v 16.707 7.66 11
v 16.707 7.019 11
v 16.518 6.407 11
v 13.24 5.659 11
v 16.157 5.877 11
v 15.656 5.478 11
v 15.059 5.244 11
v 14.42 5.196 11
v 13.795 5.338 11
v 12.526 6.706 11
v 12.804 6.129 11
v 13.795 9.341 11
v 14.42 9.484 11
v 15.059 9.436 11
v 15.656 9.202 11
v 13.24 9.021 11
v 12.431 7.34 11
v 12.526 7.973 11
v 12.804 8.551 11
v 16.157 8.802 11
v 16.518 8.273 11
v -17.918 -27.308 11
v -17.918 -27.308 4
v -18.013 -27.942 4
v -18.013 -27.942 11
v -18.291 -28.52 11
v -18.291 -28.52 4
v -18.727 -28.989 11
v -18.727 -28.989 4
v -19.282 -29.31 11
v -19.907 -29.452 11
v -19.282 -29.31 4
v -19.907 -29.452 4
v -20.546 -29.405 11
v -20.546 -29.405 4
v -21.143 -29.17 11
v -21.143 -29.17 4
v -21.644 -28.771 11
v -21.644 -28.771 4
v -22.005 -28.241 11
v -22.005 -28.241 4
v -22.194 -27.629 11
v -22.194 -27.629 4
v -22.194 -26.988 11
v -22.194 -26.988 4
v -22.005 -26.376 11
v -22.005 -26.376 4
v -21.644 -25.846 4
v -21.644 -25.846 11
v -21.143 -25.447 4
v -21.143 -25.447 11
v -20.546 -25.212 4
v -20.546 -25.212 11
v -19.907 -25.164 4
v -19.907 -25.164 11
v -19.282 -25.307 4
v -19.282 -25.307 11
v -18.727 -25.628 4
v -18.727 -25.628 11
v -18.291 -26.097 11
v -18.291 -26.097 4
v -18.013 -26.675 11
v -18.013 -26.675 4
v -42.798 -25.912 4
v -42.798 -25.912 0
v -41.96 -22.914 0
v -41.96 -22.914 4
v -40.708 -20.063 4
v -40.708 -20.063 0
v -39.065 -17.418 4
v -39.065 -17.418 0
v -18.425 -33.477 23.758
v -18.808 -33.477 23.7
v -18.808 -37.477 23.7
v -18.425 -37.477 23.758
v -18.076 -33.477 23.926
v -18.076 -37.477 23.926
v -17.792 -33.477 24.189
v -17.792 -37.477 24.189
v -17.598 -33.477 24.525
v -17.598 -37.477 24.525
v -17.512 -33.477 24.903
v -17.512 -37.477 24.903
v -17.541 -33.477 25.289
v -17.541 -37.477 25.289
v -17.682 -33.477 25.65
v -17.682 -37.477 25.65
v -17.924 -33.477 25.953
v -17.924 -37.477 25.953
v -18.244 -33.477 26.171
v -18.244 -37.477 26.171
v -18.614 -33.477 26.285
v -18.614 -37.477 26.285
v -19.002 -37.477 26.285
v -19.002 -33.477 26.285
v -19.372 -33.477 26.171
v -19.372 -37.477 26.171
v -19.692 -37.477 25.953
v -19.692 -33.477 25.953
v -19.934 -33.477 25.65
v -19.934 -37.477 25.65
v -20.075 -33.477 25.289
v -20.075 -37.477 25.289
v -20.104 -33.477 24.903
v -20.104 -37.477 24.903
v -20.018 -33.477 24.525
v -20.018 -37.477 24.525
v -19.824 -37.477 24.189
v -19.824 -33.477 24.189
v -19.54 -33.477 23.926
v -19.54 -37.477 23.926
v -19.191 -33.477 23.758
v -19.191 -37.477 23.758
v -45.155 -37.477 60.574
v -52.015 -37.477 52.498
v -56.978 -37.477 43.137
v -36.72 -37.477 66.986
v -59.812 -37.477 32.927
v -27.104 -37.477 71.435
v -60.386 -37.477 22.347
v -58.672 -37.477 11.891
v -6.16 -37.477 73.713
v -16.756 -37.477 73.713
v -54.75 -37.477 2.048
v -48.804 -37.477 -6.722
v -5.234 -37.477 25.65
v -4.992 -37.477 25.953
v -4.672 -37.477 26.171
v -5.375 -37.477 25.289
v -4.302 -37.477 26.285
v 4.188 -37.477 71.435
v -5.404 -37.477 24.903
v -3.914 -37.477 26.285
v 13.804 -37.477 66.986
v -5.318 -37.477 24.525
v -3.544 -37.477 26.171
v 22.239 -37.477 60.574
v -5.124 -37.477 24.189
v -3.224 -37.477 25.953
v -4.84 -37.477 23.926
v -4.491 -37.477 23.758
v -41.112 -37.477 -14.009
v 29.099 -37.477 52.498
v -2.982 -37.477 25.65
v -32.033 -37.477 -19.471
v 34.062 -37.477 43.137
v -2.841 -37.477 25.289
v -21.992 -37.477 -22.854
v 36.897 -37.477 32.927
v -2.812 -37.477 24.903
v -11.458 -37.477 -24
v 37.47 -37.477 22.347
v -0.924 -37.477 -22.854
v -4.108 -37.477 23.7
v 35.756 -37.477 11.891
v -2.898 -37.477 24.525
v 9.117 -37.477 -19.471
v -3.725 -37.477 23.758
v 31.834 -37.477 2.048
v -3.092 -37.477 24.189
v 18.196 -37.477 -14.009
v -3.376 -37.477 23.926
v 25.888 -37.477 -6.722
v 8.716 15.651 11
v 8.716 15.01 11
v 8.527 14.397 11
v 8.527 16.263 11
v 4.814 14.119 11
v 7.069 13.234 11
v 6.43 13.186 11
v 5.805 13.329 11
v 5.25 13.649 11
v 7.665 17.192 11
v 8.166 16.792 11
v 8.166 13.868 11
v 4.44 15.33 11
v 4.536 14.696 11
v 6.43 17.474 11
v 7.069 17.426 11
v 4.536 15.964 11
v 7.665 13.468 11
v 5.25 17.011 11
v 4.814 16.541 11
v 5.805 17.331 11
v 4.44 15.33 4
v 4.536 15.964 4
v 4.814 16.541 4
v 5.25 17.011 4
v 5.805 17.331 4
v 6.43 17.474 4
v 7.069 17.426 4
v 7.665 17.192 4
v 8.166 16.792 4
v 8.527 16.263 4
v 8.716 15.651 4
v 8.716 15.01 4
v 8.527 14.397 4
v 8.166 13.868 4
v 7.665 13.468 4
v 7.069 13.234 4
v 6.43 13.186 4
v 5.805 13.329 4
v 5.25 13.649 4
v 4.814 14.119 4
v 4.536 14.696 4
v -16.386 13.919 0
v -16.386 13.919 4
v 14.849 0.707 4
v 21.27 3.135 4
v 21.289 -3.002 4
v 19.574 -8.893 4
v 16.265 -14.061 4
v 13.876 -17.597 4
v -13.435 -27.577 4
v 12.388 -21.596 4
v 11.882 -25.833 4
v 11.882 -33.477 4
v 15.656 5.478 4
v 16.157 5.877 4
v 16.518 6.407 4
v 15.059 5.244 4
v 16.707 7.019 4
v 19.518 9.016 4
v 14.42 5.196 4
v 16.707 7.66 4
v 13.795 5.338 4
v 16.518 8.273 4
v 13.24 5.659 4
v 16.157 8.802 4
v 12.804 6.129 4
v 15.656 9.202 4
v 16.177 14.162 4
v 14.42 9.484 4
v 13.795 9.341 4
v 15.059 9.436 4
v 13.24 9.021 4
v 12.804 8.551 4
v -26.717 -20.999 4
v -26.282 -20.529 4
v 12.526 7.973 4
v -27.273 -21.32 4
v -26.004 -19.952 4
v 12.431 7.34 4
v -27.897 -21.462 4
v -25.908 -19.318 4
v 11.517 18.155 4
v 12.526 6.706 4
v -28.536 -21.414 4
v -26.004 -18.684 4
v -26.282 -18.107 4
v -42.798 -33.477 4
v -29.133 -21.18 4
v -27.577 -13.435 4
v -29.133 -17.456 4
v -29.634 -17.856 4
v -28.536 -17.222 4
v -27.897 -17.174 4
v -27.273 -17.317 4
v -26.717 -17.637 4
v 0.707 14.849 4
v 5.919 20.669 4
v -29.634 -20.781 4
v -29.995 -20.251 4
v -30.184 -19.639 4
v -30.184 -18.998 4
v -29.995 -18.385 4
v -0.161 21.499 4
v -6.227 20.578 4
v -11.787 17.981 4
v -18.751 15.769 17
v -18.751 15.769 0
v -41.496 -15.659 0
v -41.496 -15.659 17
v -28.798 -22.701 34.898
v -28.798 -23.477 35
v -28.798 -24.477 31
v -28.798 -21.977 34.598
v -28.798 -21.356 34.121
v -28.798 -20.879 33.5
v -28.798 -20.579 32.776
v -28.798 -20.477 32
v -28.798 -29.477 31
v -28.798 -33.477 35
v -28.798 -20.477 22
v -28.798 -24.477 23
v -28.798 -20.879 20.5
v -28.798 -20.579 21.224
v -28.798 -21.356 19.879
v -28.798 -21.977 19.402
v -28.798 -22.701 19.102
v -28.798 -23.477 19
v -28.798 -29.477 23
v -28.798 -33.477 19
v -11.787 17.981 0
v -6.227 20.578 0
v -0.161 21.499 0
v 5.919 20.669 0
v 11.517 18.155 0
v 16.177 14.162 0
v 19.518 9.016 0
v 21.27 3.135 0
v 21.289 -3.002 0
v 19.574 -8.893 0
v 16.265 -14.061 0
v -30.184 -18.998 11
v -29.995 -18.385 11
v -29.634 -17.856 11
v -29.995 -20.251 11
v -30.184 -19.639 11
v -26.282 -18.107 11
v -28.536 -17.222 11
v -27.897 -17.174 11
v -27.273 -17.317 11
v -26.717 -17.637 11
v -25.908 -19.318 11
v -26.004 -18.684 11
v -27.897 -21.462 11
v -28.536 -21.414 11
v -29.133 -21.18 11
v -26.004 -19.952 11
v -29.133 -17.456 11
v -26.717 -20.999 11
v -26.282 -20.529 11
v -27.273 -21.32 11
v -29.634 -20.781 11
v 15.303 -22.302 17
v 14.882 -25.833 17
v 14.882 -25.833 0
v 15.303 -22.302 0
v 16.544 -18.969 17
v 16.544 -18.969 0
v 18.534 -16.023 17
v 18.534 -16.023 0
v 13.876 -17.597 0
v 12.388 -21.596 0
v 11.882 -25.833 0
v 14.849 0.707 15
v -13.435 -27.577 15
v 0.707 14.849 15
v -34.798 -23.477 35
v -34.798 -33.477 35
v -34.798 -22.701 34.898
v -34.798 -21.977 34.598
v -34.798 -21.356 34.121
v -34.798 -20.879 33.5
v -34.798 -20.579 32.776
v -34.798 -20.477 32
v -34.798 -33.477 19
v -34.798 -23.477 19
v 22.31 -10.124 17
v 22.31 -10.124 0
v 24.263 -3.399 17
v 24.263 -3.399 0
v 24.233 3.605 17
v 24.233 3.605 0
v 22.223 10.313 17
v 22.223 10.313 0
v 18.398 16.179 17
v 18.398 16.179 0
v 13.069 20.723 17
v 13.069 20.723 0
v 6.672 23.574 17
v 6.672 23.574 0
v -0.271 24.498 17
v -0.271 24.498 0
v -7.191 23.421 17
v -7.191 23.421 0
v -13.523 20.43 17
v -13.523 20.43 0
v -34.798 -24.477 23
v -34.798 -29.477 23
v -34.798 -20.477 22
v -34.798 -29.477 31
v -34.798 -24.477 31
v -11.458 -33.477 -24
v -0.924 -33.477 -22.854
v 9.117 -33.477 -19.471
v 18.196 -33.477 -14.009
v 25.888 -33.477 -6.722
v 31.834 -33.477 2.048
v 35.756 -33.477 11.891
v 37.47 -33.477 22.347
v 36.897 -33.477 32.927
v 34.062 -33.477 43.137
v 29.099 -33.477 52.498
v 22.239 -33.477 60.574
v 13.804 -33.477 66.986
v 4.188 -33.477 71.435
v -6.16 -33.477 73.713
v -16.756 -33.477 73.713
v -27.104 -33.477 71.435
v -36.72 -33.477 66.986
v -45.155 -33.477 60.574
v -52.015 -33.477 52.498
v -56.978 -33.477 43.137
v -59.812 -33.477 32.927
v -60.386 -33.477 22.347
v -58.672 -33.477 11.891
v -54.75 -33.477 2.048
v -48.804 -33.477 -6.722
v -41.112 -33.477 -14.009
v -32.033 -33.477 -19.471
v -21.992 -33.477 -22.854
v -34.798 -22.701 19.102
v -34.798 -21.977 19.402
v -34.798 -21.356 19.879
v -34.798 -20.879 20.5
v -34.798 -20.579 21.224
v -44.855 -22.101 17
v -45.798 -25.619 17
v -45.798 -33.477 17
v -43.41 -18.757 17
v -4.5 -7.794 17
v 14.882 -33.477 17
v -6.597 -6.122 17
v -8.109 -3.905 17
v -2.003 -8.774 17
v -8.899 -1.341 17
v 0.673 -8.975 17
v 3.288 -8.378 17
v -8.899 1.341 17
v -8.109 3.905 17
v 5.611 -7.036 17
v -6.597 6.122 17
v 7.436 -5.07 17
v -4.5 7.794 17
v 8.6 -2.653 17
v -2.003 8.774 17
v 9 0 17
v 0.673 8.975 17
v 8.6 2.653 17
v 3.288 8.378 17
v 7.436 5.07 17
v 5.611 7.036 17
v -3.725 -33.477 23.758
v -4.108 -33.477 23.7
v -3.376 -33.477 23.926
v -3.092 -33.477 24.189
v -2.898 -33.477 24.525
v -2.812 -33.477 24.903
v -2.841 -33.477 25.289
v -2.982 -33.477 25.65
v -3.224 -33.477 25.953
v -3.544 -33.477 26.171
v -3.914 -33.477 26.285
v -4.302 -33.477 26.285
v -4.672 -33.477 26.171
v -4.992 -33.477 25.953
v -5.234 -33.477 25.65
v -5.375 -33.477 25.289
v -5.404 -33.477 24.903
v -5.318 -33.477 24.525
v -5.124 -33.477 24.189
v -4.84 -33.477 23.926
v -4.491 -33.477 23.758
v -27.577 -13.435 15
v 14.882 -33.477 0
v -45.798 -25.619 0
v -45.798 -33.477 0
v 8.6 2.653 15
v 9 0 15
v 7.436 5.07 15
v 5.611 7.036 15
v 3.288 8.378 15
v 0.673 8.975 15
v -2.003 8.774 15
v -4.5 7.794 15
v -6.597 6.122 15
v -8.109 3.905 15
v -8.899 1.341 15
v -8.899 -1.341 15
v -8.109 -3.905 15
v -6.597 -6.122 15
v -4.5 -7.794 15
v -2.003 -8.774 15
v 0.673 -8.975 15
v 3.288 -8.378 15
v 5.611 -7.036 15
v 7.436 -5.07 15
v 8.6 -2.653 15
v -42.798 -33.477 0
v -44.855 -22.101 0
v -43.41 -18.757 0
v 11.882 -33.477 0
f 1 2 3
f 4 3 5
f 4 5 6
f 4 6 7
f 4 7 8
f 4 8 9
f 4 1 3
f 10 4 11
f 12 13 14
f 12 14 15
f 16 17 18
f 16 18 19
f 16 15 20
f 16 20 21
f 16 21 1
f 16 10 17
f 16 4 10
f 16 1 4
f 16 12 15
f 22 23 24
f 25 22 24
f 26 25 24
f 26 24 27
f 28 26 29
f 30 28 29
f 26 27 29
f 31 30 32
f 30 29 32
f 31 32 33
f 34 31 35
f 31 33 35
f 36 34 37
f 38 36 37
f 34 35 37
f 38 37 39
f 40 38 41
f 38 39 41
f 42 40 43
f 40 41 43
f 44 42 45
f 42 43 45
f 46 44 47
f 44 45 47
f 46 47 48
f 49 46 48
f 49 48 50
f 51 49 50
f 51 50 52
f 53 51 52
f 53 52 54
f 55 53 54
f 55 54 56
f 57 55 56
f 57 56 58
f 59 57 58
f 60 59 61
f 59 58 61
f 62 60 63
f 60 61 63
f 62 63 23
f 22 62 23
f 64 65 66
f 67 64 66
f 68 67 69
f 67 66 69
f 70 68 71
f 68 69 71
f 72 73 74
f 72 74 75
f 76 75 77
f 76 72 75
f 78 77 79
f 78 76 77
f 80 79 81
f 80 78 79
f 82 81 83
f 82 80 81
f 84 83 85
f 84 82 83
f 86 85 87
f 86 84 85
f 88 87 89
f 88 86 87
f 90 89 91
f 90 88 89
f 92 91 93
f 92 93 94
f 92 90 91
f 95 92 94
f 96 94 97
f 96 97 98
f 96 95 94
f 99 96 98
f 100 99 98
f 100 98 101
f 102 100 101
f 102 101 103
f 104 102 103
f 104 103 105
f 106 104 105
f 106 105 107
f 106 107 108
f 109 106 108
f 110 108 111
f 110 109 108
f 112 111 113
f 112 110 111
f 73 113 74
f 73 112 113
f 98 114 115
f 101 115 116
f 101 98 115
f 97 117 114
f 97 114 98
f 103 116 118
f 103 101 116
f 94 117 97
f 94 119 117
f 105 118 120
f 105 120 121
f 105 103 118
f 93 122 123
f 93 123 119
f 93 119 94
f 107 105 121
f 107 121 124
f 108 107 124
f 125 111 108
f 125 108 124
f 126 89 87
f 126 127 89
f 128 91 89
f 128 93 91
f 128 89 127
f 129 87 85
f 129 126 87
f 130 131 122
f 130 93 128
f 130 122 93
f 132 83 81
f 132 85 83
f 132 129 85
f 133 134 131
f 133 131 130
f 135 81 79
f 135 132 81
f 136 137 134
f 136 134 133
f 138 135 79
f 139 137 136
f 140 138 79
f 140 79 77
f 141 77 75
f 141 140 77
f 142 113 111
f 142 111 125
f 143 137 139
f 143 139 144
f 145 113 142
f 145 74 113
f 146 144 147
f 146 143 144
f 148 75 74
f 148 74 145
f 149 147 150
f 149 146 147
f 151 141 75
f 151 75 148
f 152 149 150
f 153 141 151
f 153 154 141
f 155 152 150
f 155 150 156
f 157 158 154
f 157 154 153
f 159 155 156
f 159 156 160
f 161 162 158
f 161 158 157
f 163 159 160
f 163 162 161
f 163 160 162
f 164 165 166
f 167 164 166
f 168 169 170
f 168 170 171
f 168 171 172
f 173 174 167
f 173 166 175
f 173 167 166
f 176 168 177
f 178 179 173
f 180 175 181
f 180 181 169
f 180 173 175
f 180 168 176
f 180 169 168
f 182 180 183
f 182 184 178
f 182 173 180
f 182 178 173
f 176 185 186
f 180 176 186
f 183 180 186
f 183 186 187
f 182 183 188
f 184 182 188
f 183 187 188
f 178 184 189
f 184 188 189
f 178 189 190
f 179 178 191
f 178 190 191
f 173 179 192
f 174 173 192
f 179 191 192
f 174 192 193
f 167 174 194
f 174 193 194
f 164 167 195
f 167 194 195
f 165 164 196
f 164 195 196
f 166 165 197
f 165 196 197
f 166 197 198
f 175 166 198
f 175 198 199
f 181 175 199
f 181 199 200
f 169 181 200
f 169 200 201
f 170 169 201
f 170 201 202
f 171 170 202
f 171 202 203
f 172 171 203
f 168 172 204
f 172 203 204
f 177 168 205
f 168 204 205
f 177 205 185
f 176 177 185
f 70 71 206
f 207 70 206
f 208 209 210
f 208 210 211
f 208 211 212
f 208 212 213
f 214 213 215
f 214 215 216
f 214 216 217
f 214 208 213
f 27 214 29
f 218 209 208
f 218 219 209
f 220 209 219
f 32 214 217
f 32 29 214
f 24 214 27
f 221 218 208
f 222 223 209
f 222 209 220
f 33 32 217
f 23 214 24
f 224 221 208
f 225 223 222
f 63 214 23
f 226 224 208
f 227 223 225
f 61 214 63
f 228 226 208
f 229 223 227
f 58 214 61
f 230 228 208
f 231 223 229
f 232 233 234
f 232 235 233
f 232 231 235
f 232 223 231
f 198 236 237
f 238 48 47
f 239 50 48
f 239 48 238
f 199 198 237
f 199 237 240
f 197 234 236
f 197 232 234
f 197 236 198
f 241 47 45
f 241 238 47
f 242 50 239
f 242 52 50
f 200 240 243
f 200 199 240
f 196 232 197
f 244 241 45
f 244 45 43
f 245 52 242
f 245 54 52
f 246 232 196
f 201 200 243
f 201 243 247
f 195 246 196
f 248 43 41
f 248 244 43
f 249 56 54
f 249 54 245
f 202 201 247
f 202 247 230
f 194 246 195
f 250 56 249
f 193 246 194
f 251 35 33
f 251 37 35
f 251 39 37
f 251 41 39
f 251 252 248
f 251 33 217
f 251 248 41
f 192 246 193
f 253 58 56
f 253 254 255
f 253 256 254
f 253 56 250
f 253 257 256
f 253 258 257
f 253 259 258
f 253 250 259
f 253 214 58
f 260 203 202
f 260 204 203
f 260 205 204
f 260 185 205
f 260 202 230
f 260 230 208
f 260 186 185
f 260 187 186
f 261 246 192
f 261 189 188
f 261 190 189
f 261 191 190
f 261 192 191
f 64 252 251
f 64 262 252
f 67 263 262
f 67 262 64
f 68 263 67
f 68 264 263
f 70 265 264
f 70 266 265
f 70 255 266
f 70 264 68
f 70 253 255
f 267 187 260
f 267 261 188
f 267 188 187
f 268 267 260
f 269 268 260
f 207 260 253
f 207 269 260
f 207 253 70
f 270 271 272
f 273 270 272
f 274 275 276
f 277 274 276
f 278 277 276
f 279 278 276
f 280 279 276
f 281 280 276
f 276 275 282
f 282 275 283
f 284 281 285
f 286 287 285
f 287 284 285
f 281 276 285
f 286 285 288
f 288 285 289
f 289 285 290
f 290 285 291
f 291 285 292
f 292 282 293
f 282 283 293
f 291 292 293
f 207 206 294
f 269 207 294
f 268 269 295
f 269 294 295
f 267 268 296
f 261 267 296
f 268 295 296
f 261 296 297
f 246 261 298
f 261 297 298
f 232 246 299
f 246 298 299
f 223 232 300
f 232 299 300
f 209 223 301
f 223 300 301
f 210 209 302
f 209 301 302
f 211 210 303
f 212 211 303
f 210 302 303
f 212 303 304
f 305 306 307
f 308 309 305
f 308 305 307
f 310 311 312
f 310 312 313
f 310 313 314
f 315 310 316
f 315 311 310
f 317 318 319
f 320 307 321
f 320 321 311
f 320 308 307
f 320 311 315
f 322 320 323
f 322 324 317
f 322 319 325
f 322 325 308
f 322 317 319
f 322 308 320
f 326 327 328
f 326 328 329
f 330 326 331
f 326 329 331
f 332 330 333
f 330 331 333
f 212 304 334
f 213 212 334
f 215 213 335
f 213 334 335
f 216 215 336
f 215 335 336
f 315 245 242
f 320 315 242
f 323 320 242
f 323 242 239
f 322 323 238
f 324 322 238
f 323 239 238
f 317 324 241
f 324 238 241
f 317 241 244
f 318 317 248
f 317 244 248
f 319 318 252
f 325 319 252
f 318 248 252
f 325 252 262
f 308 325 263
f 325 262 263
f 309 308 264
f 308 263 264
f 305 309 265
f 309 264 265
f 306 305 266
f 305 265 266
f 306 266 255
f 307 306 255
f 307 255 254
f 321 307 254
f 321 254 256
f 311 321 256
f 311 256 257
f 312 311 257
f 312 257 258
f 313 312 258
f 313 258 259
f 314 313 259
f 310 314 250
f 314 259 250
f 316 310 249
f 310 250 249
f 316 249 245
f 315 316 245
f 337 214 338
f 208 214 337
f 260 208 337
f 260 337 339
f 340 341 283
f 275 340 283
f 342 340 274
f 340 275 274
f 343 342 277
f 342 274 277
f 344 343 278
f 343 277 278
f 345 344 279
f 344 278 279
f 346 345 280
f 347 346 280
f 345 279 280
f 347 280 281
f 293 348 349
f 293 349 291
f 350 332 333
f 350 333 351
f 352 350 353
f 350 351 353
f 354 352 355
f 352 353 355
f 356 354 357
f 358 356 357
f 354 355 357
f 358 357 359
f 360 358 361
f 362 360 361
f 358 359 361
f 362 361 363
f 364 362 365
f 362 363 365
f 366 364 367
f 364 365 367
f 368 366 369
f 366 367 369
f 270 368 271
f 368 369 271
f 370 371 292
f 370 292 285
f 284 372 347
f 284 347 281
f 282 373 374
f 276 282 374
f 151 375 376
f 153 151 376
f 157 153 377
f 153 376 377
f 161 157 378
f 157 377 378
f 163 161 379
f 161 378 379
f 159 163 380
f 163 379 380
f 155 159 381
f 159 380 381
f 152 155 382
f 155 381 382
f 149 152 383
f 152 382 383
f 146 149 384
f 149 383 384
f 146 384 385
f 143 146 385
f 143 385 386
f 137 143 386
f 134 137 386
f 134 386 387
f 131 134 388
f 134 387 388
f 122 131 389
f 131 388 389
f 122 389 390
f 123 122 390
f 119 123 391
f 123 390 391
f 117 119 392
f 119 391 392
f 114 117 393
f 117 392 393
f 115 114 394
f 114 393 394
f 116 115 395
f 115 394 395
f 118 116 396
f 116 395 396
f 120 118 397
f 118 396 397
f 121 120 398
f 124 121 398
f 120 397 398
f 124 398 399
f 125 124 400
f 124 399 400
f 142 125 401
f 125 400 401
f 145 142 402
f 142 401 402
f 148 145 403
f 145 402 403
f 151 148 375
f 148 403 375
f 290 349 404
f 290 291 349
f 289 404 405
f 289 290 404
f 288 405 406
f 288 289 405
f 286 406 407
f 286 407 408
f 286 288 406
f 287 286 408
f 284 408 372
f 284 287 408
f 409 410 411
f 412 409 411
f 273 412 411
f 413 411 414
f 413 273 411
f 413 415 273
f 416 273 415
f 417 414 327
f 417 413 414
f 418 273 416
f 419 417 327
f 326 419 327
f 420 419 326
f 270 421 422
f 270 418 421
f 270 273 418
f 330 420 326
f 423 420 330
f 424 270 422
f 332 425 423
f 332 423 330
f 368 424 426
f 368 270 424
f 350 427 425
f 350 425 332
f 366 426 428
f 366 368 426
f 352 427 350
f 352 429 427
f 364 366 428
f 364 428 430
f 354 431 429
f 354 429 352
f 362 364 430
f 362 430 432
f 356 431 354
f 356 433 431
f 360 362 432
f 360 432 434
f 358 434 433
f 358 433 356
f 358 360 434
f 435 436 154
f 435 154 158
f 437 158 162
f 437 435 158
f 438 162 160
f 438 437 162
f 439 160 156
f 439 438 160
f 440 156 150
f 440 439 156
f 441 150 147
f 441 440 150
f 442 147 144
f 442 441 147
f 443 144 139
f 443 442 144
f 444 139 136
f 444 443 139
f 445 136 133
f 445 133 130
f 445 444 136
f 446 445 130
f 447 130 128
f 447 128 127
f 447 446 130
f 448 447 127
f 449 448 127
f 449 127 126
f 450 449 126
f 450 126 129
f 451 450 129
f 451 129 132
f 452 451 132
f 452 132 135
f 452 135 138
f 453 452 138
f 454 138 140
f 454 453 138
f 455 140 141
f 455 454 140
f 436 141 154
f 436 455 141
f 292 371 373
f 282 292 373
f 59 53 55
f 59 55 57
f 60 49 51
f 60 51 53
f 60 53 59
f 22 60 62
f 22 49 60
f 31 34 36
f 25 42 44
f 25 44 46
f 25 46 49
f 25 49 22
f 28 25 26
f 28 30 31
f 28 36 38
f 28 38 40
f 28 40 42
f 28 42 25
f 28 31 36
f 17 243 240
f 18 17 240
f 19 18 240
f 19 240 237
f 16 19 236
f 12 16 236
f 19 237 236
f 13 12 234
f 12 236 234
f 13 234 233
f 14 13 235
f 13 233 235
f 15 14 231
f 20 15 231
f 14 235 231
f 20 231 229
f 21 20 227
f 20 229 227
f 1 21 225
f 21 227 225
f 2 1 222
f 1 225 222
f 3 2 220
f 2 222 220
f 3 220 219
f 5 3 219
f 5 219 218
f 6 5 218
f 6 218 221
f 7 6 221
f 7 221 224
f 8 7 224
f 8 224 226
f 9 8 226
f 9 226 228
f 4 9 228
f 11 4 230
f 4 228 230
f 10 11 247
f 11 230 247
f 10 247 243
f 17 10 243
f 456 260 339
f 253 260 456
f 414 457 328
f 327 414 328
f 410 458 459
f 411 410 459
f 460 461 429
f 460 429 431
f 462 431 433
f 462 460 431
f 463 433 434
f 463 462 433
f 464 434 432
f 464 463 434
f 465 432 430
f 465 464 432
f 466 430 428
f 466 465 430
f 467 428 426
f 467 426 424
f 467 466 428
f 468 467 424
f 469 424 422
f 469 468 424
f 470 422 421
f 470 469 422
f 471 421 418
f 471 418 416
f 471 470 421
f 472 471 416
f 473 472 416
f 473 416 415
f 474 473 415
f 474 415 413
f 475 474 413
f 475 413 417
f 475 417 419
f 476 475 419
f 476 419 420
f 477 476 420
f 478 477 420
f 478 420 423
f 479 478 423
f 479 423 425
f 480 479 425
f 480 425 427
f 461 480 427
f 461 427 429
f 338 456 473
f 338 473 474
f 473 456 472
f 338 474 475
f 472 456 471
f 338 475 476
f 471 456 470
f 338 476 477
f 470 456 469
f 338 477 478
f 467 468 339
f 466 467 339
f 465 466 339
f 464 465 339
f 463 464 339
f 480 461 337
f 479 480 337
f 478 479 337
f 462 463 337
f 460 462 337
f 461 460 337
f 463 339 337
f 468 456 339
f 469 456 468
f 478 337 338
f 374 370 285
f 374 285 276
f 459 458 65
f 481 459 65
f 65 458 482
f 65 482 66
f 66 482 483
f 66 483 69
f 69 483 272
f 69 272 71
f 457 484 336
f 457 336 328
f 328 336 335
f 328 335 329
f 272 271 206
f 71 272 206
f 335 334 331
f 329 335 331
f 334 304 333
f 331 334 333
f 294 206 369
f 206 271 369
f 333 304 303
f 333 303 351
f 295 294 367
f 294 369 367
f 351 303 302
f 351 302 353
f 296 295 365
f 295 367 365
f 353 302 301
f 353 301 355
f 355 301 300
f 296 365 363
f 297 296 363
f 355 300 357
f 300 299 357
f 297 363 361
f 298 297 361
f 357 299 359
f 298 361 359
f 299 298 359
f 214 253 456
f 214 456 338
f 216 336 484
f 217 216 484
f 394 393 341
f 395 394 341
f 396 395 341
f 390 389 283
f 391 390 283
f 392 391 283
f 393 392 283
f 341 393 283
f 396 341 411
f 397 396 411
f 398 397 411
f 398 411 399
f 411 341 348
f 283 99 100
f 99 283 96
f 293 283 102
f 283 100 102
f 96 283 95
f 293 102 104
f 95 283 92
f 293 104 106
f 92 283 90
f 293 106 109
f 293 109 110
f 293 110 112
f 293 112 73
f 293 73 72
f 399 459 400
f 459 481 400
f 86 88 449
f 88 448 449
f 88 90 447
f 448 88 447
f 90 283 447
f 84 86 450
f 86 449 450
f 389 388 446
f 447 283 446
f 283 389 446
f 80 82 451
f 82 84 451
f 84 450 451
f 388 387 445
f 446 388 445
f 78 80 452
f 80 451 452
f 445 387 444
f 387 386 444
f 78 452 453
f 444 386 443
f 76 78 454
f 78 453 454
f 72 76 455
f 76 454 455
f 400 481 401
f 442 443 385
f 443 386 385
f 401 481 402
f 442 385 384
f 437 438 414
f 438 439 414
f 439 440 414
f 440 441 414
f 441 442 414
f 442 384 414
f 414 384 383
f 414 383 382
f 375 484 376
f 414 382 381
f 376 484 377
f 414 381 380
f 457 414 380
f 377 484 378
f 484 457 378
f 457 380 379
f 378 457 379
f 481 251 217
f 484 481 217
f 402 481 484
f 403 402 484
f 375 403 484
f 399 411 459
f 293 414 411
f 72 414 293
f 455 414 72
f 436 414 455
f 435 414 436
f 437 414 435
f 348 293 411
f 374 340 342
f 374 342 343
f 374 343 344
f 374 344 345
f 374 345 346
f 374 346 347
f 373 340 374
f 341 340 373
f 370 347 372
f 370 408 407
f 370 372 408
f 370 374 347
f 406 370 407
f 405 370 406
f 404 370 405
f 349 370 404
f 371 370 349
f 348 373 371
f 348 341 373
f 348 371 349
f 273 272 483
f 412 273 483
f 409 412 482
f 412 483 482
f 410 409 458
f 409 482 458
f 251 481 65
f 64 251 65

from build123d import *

# Parameters (mm, degrees)
SKETCH2_R           = 9
BOSS_EXTRUDE1_DEPTH = 17
CUT_EXTRUDE1_DEPTH  = 4
SKETCH5_R           = 9
CUT_EXTRUDE3_DEPTH  = 11
SKETCH7_R           = 2.15
CUT_EXTRUDE4_DEPTH  = 7
SKETCH8_R           = 49
SKETCH8_R_2         = 1.3
BOSS_EXTRUDE2_DEPTH = 4
SKETCH9_W           = 6
SKETCH9_H           = 16
BOSS_EXTRUDE3_DEPTH = 13
FILLET1_R           = 3
SKETCH10_W          = 8
SKETCH10_H          = 5
CUT_EXTRUDE5_DEPTH  = 13


with BuildPart() as part:
    # Sketch2 → Boss-Extrude1 (new body)
    with BuildSketch(Plane.XY):
        with BuildLine():
            Line((14.881784229, -33.477238974), (14.881784229, -25.832605203))
            ThreePointArc((14.881784229, -25.832605203), (15.824526426, -20.598724896), (18.534251304, -16.022737899))
            ThreePointArc((18.534251304, -16.022737899), (15.896271469, 18.642831184), (-18.750548152, 15.769069256))
            Line((-18.750548152, 15.769069256), (-41.495728933, -15.659285702))
            ThreePointArc((-41.495728933, -15.659285702), (-44.193480097, -20.402788352), (-45.797718556, -25.618638973))
            Line((-45.797718556, -25.618638973), (-45.797718556, -33.477238974))
            Line((-45.797718556, -33.477238974), (14.881784229, -33.477238974))
        make_face()
        Circle(SKETCH2_R, mode=Mode.SUBTRACT)
    extrude(amount=BOSS_EXTRUDE1_DEPTH)

    # Sketch4 → Cut-Extrude1 (cut)
    with BuildSketch(Plane(origin=(0, 0, 0), x_dir=(-1, 0, 0), z_dir=(0, 0, -1))):
        with BuildLine():
            Line((-11.881784229, -30.477238974), (-11.881784229, -33.477238974))
            Line((-11.881784229, -33.477238974), (42.797718556, -33.477238974))
            Line((42.797718556, -33.477238974), (42.797718556, -30.477238974))
            Line((42.797718556, -30.477238974), (42.797718556, -25.912200391))
            ThreePointArc((42.797718556, -25.912200391), (41.384433584, -21.466180319), (39.065414716, -17.418141241))
            Line((39.065414716, -17.418141241), (16.386356383, 13.918848439))
            ThreePointArc((16.386356383, 13.918848439), (-13.989938582, 16.325704757), (-16.264744719, -14.060764438))
            ThreePointArc((-16.264744719, -14.060764438), (-13.013074866, -19.551948835), (-11.881784229, -25.832605203))
            Line((-11.881784229, -25.832605203), (-11.881784229, -30.477238974))
        make_face()
    extrude(amount=-CUT_EXTRUDE1_DEPTH, mode=Mode.SUBTRACT)

    # Sketch5 → Cut-Extrude3 (cut)
    with BuildSketch(Plane(origin=(0, 0, 4), x_dir=(-1, 0, 0), z_dir=(0, 0, -1))):
        Polygon((-14.849242405, 0.707106781), (-0.707106781, 14.849242405), (27.577164466, -13.435028843), (13.435028843, -27.577164466), align=None)
        Circle(SKETCH5_R, mode=Mode.SUBTRACT)
    extrude(amount=-CUT_EXTRUDE3_DEPTH, mode=Mode.SUBTRACT)

    # Sketch7 → Cut-Extrude4 (cut)
    with BuildSketch(Plane(origin=(0, 0, 4), x_dir=(-1, 0, 0), z_dir=(0, 0, -1))):
        with Locations((-6.590235201, 15.330075016)):
            Circle(SKETCH7_R)
        with Locations((-14.580541828, 7.339768389)):
            Circle(SKETCH7_R)
        with Locations(Location((20.06769045, -27.308463889, 0), (0, 0, 180))):
            Circle(SKETCH7_R)
        with Locations(Location((28.057997077, -19.318157262, 0), (0, 0, 180))):
            Circle(SKETCH7_R)
    extrude(amount=-CUT_EXTRUDE4_DEPTH, mode=Mode.SUBTRACT)

    # Sketch8 → Boss-Extrude2 (add)
    with BuildSketch(Plane.XZ.offset(33.477238974)):
        with Locations(Location((-11.457967164, 25, 0), (0, 0, 270))):
            Circle(SKETCH8_R)
        with Locations(Location((-18.807967164, 25, 0), (0, 0, 270))):
            Circle(SKETCH8_R_2, mode=Mode.SUBTRACT)
        with Locations(Location((-4.107967164, 25, 0), (0, 0, 270))):
            Circle(SKETCH8_R_2, mode=Mode.SUBTRACT)
    extrude(amount=BOSS_EXTRUDE2_DEPTH)

    # Sketch9 → Boss-Extrude3 (add)
    with BuildSketch(Plane(origin=(0, -33.477238974, 0), x_dir=(1, 0, 0), z_dir=(0, 1, 0))):
        with Locations((-31.797718556, -27)):
            Rectangle(SKETCH9_W, SKETCH9_H)
    extrude(amount=BOSS_EXTRUDE3_DEPTH)

    # Fillet1
    fillet1_edges = [part.edges().sort_by_distance(p)[0] for p in [
        (-31.797718556, -20.477238974, 35),
        (-31.797718556, -20.477238974, 19),
    ]]
    fillet(fillet1_edges, radius=FILLET1_R)

    # Sketch10 → Cut-Extrude5 (cut)
    with BuildSketch(Plane.ZY.offset(34.797718556)):
        with Locations((27, -26.977238974)):
            Rectangle(SKETCH10_W, SKETCH10_H)
    extrude(amount=-CUT_EXTRUDE5_DEPTH, mode=Mode.SUBTRACT)


solid = part.part
